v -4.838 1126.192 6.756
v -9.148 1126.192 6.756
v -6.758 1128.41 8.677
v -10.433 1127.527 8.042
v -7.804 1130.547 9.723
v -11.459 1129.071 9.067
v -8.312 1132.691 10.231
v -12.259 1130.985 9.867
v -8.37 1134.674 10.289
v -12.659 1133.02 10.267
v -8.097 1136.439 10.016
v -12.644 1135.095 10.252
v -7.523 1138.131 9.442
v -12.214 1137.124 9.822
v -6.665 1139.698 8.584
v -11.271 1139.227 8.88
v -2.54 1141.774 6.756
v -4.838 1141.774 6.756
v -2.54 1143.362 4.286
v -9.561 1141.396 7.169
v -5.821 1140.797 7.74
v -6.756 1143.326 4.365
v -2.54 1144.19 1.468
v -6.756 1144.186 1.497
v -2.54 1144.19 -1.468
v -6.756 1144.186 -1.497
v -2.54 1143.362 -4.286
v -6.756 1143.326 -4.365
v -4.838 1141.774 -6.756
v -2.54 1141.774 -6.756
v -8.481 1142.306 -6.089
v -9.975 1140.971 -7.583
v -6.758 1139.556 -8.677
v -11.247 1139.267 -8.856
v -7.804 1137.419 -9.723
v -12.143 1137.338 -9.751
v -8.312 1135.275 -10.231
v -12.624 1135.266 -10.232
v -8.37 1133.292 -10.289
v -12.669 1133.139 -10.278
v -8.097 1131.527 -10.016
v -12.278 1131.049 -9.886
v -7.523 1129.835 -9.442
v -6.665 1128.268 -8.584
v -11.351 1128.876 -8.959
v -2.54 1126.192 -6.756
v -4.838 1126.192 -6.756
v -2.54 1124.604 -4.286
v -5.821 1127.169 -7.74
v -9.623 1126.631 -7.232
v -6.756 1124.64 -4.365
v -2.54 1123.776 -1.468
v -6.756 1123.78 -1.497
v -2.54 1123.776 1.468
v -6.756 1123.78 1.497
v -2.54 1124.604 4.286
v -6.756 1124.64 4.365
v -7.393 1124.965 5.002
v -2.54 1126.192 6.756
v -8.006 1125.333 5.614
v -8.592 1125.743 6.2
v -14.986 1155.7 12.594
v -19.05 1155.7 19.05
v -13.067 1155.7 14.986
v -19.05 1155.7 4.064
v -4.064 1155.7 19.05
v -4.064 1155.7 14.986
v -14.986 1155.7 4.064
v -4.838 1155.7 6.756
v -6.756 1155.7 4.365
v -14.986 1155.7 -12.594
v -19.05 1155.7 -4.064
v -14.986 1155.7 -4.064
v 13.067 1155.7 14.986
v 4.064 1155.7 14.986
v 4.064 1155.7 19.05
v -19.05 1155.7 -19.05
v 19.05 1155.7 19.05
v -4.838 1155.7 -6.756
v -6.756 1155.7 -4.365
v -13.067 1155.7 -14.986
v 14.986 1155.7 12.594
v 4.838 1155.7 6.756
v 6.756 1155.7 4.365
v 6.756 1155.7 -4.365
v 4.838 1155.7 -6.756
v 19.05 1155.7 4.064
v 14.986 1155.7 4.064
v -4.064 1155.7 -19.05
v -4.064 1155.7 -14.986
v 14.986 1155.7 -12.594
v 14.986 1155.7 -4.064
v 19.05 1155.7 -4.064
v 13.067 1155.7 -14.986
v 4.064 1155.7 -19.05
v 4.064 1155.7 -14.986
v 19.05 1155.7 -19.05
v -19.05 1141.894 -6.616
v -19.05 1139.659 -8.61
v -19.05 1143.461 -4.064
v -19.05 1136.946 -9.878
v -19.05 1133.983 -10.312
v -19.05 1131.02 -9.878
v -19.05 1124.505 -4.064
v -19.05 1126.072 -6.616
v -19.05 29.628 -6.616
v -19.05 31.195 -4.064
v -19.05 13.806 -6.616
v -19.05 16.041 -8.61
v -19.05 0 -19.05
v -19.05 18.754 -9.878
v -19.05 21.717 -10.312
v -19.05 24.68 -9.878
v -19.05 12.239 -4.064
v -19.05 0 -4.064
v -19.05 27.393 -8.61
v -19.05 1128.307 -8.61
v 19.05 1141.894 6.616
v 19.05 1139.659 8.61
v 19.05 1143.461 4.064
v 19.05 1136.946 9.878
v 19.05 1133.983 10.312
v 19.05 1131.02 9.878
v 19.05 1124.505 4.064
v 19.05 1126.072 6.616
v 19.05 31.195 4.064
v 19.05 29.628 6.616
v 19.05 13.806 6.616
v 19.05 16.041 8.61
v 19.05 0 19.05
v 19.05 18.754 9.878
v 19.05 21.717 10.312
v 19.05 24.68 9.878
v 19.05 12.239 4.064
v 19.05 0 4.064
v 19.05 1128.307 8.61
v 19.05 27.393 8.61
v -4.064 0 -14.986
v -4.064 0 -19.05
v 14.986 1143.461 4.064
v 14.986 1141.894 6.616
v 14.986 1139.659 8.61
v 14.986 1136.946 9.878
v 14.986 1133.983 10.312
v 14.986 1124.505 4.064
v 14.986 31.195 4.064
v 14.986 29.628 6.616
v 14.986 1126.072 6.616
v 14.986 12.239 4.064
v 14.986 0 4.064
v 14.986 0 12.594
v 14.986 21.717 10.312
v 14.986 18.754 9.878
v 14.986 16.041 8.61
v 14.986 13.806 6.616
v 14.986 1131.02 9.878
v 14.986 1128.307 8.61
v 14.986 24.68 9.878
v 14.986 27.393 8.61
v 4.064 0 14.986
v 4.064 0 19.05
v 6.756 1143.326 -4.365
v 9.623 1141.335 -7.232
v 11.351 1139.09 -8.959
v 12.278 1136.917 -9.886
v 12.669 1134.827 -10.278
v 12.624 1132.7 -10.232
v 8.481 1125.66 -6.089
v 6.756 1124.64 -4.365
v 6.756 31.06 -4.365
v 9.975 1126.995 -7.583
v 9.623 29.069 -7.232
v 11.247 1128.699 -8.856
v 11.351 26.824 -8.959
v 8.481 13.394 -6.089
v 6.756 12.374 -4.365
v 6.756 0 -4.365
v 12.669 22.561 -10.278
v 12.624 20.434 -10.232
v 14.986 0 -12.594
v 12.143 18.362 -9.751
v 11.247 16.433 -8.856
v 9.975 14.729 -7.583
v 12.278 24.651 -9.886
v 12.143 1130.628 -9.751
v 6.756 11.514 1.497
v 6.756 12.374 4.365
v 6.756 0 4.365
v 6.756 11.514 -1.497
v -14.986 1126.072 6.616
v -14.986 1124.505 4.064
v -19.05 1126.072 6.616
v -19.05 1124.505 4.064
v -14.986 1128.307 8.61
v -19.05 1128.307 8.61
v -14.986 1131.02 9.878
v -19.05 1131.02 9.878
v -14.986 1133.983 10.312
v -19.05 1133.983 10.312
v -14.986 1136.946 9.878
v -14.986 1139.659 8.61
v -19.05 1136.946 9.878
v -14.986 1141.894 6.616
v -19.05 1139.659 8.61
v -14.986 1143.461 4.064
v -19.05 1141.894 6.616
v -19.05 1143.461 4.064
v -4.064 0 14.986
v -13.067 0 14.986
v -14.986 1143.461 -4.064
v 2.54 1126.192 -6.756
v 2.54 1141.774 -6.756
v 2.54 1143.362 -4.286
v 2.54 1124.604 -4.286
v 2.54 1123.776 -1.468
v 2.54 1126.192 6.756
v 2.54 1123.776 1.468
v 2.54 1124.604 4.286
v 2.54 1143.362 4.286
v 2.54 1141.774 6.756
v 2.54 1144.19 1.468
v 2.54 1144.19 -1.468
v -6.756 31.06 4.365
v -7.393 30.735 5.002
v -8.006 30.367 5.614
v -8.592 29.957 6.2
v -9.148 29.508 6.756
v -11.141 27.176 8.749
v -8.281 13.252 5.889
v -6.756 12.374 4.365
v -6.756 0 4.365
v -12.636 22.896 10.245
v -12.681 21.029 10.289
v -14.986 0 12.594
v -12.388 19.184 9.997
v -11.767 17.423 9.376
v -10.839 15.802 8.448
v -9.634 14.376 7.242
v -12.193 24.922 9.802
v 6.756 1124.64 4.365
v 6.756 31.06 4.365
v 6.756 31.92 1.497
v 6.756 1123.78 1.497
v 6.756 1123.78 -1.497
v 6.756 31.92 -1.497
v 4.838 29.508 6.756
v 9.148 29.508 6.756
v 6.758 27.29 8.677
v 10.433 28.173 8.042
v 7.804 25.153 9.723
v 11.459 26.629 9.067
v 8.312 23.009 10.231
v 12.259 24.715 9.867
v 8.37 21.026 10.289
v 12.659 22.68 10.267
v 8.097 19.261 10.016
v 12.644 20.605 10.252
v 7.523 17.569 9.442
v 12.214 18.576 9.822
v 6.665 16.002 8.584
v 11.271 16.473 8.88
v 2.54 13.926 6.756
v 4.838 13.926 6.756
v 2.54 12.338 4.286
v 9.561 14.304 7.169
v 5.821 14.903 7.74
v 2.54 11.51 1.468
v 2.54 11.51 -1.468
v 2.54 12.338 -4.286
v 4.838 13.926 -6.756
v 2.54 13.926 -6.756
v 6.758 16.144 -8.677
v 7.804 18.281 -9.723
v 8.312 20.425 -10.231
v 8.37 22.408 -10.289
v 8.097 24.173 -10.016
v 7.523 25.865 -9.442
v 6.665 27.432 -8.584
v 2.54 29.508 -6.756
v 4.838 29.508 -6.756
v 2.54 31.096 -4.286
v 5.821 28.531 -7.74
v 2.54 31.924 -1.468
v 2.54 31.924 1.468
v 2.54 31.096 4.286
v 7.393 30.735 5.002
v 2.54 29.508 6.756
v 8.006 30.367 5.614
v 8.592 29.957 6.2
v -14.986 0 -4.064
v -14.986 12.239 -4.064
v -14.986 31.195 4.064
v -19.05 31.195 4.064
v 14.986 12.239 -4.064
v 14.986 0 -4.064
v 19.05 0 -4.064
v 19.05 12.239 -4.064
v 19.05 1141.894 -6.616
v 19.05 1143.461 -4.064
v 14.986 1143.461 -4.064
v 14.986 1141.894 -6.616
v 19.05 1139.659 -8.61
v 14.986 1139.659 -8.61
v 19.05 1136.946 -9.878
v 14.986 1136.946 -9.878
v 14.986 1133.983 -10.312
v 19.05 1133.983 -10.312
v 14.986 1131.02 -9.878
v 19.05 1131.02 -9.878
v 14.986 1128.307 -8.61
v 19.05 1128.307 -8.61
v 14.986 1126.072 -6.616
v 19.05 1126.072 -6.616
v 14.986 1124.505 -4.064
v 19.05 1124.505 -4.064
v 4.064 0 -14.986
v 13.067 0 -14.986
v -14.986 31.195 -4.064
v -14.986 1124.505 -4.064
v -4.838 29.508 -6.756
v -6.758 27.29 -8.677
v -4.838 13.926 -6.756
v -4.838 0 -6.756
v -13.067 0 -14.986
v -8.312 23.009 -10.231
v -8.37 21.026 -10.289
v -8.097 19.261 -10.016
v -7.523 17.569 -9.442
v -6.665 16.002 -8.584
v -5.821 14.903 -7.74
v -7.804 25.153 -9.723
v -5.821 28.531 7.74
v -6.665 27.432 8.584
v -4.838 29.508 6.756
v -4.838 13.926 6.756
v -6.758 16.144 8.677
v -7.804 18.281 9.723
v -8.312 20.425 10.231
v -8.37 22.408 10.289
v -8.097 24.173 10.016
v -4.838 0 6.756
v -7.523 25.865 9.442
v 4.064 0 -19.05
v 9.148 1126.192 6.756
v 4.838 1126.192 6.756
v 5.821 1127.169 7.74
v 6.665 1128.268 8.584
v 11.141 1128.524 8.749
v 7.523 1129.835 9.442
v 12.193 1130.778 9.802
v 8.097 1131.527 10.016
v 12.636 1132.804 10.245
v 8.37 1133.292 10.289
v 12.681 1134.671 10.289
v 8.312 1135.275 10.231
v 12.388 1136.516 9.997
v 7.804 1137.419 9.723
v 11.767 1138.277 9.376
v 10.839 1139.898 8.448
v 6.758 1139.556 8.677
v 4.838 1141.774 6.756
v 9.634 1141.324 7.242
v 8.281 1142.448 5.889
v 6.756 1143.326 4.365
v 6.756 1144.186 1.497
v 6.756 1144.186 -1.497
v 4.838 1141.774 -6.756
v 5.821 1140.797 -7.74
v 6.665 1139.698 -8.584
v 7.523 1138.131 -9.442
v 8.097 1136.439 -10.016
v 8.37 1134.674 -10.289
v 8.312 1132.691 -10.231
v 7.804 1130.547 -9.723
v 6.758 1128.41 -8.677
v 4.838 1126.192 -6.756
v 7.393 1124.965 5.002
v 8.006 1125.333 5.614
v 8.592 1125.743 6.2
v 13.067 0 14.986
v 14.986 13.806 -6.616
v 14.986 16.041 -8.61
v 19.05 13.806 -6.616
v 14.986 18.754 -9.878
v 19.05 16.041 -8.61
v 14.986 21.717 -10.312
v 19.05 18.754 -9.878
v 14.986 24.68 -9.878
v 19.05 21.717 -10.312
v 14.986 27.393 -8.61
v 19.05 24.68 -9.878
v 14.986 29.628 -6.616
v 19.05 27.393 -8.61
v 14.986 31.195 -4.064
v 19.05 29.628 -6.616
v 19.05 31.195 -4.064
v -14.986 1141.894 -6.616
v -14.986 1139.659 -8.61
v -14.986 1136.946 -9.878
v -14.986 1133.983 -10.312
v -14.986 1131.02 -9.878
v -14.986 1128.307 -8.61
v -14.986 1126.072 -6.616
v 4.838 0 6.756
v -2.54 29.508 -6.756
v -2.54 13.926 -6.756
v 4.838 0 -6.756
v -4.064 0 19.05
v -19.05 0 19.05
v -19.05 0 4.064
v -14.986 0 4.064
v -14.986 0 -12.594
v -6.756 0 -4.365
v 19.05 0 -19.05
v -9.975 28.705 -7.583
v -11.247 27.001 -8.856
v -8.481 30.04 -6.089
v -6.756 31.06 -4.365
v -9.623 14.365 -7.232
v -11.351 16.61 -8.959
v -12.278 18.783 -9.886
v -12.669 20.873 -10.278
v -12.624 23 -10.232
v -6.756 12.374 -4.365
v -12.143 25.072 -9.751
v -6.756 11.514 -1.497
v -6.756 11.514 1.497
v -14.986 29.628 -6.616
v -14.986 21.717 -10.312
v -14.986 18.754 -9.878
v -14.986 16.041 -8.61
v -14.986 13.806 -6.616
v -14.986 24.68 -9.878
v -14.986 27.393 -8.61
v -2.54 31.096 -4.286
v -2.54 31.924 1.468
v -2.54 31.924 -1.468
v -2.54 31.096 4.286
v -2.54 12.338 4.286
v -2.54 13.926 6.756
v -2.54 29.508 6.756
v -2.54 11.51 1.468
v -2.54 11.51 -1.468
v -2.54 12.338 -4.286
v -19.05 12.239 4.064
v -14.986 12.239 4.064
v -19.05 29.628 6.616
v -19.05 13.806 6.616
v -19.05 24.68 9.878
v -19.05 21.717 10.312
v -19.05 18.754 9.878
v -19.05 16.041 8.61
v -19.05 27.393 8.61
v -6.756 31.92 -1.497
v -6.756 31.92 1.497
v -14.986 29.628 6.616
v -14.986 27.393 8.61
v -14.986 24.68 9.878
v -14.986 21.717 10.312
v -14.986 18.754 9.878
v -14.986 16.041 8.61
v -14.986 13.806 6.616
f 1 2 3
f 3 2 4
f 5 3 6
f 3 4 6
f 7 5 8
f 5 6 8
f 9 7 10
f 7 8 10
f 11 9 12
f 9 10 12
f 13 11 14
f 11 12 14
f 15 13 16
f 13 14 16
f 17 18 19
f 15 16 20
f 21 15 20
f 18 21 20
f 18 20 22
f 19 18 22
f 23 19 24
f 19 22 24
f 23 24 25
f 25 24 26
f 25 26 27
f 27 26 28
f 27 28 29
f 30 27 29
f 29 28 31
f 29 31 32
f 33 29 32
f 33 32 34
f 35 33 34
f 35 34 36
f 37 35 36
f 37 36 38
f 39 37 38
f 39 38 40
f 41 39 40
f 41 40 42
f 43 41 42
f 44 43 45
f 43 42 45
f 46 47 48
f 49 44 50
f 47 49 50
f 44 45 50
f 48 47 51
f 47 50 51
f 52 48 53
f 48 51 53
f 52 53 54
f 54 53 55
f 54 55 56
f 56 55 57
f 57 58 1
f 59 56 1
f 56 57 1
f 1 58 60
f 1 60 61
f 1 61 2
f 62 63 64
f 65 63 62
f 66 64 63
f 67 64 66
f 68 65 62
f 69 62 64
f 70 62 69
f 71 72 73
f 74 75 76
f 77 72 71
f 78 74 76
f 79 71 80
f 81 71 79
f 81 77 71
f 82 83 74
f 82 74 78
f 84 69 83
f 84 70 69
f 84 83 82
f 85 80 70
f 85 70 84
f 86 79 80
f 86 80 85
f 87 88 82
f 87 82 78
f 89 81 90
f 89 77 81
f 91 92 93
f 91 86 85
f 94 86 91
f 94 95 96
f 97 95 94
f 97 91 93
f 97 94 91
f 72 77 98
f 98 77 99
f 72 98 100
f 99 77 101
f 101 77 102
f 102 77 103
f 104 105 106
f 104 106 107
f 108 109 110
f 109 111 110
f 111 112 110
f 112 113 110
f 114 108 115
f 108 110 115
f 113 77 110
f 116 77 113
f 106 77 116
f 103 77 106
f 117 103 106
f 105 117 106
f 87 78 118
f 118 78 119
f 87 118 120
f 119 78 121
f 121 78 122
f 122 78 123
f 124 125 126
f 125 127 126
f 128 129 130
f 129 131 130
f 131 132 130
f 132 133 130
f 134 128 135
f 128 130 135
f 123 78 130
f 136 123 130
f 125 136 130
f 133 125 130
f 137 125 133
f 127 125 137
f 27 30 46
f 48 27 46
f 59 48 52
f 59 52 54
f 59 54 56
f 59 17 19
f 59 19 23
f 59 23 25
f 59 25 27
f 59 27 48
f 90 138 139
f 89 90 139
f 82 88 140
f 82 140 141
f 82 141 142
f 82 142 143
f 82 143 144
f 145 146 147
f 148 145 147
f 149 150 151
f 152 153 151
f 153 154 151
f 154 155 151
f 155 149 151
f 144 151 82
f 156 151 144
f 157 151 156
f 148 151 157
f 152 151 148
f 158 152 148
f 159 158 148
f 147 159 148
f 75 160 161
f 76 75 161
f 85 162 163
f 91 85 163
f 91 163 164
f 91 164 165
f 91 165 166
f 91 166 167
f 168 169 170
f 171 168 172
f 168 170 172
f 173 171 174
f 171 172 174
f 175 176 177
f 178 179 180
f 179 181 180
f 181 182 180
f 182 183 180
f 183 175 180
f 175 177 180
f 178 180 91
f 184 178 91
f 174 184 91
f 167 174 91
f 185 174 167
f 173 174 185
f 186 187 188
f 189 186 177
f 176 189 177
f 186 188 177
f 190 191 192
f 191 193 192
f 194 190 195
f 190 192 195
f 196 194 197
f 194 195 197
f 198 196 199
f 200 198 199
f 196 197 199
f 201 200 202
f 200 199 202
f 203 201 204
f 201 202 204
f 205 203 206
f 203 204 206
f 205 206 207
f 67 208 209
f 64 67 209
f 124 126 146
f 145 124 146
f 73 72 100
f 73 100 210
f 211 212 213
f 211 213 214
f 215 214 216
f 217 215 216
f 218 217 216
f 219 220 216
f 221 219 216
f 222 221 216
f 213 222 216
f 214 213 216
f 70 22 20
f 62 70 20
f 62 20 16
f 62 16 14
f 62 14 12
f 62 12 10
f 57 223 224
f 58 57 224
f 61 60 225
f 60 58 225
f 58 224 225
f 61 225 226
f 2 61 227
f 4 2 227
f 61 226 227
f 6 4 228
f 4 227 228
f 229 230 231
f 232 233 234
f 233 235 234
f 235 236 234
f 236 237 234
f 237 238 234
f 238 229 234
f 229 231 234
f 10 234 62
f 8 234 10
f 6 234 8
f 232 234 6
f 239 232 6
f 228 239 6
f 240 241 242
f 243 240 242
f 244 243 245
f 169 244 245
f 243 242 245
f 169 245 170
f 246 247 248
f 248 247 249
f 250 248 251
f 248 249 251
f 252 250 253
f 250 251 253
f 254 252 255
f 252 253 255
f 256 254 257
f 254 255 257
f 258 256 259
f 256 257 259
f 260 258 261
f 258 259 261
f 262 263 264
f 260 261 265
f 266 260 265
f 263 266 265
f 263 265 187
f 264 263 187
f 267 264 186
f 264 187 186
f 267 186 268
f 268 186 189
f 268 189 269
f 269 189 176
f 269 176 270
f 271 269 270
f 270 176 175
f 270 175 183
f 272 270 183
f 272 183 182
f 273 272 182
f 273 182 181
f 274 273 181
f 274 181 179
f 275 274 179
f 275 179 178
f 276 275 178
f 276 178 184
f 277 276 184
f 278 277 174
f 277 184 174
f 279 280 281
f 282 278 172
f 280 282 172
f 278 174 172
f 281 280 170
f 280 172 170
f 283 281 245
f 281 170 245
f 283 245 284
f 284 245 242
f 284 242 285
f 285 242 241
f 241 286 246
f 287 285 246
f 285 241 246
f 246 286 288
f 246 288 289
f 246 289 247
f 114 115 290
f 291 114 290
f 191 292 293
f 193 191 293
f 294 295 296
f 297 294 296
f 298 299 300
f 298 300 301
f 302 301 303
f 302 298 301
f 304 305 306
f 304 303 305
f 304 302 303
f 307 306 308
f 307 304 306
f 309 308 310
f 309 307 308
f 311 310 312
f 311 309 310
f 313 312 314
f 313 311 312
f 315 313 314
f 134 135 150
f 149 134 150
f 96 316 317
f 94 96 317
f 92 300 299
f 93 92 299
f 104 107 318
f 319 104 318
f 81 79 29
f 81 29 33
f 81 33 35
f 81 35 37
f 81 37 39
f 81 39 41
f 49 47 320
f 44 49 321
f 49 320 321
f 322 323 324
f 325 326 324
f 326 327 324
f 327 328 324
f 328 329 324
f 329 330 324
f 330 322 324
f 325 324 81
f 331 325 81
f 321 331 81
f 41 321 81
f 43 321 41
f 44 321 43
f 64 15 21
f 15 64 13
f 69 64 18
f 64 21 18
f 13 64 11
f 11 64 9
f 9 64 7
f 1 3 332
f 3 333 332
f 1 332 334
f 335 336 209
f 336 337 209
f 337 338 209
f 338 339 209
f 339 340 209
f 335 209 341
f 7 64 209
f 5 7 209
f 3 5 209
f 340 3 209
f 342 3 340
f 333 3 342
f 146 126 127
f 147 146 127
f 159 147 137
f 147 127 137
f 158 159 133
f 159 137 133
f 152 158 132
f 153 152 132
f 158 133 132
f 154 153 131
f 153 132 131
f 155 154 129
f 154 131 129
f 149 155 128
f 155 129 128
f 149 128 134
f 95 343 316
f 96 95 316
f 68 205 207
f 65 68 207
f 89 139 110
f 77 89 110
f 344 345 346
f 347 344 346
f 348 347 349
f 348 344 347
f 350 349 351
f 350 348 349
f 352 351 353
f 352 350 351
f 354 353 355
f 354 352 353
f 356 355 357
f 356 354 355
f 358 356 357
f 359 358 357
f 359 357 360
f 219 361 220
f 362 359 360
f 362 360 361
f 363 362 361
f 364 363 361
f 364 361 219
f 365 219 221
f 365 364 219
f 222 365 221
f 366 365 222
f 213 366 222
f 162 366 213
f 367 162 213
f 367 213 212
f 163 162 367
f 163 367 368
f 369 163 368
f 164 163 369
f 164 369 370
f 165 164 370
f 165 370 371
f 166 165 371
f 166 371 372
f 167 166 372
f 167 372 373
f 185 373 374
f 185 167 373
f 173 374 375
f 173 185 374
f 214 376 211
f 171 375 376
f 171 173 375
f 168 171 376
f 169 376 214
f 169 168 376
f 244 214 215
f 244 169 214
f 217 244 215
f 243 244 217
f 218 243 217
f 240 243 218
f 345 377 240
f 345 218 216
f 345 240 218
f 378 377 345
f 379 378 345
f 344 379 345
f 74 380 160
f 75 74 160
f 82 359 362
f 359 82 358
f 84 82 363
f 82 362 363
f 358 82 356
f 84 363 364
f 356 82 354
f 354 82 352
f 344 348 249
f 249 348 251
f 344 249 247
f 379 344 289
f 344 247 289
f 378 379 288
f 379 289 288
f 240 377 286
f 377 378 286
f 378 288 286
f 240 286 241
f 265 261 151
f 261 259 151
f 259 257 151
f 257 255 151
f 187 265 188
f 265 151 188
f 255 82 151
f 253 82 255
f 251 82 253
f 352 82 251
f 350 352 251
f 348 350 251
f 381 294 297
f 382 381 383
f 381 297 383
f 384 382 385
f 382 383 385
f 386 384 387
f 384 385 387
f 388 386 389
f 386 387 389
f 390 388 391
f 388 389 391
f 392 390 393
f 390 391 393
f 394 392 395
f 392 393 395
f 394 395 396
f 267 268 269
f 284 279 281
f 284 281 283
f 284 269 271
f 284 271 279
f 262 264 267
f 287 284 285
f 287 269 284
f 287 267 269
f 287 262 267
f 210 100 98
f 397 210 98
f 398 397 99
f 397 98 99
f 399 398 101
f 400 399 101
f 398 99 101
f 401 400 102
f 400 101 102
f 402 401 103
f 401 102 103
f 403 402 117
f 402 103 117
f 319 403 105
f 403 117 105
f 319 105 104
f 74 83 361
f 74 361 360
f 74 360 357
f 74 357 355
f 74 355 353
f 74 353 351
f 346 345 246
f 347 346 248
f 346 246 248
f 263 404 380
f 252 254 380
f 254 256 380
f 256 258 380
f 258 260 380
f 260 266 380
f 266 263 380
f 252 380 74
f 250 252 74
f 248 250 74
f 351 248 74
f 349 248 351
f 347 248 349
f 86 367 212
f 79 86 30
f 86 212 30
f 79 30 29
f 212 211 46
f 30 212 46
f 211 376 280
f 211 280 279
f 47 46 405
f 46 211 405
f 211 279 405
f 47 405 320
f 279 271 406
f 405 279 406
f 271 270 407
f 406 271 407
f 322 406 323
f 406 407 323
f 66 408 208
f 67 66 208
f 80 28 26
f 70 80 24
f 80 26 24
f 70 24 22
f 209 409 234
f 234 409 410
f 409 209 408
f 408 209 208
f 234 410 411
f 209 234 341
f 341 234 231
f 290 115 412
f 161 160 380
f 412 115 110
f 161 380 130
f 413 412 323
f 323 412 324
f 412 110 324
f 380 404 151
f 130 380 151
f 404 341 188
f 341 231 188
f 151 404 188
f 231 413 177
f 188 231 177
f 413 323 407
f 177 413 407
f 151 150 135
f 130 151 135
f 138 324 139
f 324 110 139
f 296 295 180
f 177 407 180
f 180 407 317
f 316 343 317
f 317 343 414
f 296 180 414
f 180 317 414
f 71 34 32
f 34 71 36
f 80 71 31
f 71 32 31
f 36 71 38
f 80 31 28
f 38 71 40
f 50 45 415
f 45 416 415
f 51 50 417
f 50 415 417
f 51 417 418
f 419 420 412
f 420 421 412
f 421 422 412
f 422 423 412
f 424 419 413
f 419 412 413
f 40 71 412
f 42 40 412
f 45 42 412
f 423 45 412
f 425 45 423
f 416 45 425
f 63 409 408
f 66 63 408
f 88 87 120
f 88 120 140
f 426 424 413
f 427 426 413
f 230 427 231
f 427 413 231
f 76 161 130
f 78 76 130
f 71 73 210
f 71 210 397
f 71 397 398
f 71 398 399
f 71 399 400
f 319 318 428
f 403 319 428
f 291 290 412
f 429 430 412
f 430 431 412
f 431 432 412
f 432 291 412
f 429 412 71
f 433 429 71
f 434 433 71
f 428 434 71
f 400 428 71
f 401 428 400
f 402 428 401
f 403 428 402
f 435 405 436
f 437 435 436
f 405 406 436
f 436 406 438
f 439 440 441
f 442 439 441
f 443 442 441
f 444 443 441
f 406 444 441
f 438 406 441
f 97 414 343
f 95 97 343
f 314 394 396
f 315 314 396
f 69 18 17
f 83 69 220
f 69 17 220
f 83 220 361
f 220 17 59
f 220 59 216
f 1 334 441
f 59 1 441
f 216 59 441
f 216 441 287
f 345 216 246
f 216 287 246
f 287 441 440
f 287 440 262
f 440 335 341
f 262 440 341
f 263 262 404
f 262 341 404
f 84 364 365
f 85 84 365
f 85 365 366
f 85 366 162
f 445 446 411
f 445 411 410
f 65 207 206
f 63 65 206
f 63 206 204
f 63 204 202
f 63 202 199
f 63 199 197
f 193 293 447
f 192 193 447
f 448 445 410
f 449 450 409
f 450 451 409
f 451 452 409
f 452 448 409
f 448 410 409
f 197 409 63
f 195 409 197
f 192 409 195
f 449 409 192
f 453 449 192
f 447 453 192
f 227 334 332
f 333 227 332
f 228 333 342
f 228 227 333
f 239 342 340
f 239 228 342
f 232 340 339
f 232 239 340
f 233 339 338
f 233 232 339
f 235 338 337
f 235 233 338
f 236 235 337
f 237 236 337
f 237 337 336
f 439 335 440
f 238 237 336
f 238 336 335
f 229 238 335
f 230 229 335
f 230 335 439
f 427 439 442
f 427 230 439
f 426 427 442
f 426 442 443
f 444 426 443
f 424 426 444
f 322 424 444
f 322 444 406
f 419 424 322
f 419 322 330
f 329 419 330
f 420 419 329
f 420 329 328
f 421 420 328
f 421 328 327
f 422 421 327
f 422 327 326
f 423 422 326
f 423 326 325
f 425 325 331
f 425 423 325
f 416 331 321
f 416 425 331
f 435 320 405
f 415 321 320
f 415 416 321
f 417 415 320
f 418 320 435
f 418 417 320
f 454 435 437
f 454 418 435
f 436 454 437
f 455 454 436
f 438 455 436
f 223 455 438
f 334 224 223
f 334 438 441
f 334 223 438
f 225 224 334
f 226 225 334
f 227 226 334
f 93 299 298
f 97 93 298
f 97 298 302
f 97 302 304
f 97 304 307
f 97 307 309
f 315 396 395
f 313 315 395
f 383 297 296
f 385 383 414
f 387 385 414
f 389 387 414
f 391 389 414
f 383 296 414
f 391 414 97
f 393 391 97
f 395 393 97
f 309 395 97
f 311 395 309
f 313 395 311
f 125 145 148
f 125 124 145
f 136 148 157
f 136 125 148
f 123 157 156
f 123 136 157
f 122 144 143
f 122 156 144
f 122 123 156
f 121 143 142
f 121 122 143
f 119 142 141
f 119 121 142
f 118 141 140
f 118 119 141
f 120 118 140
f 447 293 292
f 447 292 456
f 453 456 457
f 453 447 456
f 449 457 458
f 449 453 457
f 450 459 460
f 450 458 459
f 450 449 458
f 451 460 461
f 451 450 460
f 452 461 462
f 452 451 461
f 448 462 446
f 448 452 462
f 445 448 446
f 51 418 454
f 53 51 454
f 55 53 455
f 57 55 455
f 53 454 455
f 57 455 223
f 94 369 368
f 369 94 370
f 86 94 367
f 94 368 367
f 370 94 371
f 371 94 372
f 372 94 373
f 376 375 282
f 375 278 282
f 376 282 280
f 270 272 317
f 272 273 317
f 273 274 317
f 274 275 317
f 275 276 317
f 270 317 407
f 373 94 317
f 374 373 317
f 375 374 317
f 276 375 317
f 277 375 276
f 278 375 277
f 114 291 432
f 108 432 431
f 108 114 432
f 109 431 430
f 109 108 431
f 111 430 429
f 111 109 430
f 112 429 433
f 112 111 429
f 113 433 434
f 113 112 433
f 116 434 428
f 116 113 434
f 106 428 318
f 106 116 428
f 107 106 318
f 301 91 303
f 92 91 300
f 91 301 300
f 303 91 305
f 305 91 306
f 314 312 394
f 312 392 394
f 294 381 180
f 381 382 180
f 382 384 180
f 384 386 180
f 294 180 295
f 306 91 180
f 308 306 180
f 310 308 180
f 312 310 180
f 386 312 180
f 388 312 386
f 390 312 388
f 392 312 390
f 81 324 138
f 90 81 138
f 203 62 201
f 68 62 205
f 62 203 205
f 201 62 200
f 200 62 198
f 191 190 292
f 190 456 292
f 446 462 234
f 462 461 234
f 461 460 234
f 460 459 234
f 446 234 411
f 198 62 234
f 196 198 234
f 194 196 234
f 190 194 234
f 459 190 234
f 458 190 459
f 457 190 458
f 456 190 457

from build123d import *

# Parameters (mm, degrees)
EXTRUDE1_DEPTH          = 1155.7
SKETCH2_R               = 10.3124
EXTRUDE2_DEPTH          = 16.51
MIRROR2_COPY_1_SKETCH_R = 10.3124
MIRROR2_COPY_1_DEPTH    = 16.51


# Read off the part's stored shape, not the designer's step: 1515<1>
with BuildPart() as part:
    # Sketch1<2> → Extrude1 (new body)
    with BuildSketch(Plane(origin=(0, 0, 0), x_dir=(1, 0, 0), z_dir=(0, 1, 0))):
        Polygon((-6.7564, 4.364749804), (-6.7564, -4.364749804), (-14.986, -12.594349804), (-14.986, -4.064), (-19.05, -4.064), (-19.05, -19.05), (-4.064, -19.05), (-4.064, -14.986), (-13.067127258, -14.986), (-4.837527258, -6.7564), (4.837527258, -6.7564), (13.067127258, -14.986), (4.064, -14.986), (4.064, -19.05), (19.05, -19.05), (19.05, -4.064), (14.986, -4.064), (14.986, -12.594349804), (6.7564, -4.364749804), (6.7564, 4.364749804), (14.986, 12.594349804), (14.986, 4.064), (19.05, 4.064), (19.05, 19.05), (4.064, 19.05), (4.064, 14.986), (13.067127258, 14.986), (4.837527258, 6.7564), (-4.837527258, 6.7564), (-13.067127258, 14.986), (-4.064, 14.986), (-4.064, 19.05), (-19.05, 19.05), (-19.05, 4.064), (-14.986, 4.064), (-14.986, 12.594349804), align=None)
    extrude(amount=EXTRUDE1_DEPTH)

    # Sketch2 → Extrude2 (cut)
    with BuildSketch(Plane.ZY.offset(19.05)):
        with Locations(Location((0, 1133.983, 0), (0, 0, 310.932724574))):
            Circle(SKETCH2_R)
    extrude2 = extrude(amount=-EXTRUDE2_DEPTH, mode=Mode.SUBTRACT)

    # Mirror1: Extrude2 across plane
    add(extrude2.mirror(Plane(origin=(0, 0, 0), x_dir=(0, 0, 1), z_dir=(1, 0, 0))), mode=Mode.SUBTRACT)

    # Mirror2: Extrude2 across plane
    add(extrude2.mirror(Plane(origin=(0, 577.85, 0), x_dir=(0, 0, 1), z_dir=(0, -1, 0))), mode=Mode.SUBTRACT)

    # Mirror2 copy 1 sketch → Mirror2 copy 1 (cut)
    with BuildSketch(Plane(origin=(19.05, 1155.7, 0), x_dir=(0, 0, 1), z_dir=(1, 0, 0))):
        with Locations(Location((0, 1133.983, 0), (0, 0, 310.932724574))):
            Circle(MIRROR2_COPY_1_SKETCH_R)
    extrude(amount=-MIRROR2_COPY_1_DEPTH, mode=Mode.SUBTRACT)


solid = part.part
